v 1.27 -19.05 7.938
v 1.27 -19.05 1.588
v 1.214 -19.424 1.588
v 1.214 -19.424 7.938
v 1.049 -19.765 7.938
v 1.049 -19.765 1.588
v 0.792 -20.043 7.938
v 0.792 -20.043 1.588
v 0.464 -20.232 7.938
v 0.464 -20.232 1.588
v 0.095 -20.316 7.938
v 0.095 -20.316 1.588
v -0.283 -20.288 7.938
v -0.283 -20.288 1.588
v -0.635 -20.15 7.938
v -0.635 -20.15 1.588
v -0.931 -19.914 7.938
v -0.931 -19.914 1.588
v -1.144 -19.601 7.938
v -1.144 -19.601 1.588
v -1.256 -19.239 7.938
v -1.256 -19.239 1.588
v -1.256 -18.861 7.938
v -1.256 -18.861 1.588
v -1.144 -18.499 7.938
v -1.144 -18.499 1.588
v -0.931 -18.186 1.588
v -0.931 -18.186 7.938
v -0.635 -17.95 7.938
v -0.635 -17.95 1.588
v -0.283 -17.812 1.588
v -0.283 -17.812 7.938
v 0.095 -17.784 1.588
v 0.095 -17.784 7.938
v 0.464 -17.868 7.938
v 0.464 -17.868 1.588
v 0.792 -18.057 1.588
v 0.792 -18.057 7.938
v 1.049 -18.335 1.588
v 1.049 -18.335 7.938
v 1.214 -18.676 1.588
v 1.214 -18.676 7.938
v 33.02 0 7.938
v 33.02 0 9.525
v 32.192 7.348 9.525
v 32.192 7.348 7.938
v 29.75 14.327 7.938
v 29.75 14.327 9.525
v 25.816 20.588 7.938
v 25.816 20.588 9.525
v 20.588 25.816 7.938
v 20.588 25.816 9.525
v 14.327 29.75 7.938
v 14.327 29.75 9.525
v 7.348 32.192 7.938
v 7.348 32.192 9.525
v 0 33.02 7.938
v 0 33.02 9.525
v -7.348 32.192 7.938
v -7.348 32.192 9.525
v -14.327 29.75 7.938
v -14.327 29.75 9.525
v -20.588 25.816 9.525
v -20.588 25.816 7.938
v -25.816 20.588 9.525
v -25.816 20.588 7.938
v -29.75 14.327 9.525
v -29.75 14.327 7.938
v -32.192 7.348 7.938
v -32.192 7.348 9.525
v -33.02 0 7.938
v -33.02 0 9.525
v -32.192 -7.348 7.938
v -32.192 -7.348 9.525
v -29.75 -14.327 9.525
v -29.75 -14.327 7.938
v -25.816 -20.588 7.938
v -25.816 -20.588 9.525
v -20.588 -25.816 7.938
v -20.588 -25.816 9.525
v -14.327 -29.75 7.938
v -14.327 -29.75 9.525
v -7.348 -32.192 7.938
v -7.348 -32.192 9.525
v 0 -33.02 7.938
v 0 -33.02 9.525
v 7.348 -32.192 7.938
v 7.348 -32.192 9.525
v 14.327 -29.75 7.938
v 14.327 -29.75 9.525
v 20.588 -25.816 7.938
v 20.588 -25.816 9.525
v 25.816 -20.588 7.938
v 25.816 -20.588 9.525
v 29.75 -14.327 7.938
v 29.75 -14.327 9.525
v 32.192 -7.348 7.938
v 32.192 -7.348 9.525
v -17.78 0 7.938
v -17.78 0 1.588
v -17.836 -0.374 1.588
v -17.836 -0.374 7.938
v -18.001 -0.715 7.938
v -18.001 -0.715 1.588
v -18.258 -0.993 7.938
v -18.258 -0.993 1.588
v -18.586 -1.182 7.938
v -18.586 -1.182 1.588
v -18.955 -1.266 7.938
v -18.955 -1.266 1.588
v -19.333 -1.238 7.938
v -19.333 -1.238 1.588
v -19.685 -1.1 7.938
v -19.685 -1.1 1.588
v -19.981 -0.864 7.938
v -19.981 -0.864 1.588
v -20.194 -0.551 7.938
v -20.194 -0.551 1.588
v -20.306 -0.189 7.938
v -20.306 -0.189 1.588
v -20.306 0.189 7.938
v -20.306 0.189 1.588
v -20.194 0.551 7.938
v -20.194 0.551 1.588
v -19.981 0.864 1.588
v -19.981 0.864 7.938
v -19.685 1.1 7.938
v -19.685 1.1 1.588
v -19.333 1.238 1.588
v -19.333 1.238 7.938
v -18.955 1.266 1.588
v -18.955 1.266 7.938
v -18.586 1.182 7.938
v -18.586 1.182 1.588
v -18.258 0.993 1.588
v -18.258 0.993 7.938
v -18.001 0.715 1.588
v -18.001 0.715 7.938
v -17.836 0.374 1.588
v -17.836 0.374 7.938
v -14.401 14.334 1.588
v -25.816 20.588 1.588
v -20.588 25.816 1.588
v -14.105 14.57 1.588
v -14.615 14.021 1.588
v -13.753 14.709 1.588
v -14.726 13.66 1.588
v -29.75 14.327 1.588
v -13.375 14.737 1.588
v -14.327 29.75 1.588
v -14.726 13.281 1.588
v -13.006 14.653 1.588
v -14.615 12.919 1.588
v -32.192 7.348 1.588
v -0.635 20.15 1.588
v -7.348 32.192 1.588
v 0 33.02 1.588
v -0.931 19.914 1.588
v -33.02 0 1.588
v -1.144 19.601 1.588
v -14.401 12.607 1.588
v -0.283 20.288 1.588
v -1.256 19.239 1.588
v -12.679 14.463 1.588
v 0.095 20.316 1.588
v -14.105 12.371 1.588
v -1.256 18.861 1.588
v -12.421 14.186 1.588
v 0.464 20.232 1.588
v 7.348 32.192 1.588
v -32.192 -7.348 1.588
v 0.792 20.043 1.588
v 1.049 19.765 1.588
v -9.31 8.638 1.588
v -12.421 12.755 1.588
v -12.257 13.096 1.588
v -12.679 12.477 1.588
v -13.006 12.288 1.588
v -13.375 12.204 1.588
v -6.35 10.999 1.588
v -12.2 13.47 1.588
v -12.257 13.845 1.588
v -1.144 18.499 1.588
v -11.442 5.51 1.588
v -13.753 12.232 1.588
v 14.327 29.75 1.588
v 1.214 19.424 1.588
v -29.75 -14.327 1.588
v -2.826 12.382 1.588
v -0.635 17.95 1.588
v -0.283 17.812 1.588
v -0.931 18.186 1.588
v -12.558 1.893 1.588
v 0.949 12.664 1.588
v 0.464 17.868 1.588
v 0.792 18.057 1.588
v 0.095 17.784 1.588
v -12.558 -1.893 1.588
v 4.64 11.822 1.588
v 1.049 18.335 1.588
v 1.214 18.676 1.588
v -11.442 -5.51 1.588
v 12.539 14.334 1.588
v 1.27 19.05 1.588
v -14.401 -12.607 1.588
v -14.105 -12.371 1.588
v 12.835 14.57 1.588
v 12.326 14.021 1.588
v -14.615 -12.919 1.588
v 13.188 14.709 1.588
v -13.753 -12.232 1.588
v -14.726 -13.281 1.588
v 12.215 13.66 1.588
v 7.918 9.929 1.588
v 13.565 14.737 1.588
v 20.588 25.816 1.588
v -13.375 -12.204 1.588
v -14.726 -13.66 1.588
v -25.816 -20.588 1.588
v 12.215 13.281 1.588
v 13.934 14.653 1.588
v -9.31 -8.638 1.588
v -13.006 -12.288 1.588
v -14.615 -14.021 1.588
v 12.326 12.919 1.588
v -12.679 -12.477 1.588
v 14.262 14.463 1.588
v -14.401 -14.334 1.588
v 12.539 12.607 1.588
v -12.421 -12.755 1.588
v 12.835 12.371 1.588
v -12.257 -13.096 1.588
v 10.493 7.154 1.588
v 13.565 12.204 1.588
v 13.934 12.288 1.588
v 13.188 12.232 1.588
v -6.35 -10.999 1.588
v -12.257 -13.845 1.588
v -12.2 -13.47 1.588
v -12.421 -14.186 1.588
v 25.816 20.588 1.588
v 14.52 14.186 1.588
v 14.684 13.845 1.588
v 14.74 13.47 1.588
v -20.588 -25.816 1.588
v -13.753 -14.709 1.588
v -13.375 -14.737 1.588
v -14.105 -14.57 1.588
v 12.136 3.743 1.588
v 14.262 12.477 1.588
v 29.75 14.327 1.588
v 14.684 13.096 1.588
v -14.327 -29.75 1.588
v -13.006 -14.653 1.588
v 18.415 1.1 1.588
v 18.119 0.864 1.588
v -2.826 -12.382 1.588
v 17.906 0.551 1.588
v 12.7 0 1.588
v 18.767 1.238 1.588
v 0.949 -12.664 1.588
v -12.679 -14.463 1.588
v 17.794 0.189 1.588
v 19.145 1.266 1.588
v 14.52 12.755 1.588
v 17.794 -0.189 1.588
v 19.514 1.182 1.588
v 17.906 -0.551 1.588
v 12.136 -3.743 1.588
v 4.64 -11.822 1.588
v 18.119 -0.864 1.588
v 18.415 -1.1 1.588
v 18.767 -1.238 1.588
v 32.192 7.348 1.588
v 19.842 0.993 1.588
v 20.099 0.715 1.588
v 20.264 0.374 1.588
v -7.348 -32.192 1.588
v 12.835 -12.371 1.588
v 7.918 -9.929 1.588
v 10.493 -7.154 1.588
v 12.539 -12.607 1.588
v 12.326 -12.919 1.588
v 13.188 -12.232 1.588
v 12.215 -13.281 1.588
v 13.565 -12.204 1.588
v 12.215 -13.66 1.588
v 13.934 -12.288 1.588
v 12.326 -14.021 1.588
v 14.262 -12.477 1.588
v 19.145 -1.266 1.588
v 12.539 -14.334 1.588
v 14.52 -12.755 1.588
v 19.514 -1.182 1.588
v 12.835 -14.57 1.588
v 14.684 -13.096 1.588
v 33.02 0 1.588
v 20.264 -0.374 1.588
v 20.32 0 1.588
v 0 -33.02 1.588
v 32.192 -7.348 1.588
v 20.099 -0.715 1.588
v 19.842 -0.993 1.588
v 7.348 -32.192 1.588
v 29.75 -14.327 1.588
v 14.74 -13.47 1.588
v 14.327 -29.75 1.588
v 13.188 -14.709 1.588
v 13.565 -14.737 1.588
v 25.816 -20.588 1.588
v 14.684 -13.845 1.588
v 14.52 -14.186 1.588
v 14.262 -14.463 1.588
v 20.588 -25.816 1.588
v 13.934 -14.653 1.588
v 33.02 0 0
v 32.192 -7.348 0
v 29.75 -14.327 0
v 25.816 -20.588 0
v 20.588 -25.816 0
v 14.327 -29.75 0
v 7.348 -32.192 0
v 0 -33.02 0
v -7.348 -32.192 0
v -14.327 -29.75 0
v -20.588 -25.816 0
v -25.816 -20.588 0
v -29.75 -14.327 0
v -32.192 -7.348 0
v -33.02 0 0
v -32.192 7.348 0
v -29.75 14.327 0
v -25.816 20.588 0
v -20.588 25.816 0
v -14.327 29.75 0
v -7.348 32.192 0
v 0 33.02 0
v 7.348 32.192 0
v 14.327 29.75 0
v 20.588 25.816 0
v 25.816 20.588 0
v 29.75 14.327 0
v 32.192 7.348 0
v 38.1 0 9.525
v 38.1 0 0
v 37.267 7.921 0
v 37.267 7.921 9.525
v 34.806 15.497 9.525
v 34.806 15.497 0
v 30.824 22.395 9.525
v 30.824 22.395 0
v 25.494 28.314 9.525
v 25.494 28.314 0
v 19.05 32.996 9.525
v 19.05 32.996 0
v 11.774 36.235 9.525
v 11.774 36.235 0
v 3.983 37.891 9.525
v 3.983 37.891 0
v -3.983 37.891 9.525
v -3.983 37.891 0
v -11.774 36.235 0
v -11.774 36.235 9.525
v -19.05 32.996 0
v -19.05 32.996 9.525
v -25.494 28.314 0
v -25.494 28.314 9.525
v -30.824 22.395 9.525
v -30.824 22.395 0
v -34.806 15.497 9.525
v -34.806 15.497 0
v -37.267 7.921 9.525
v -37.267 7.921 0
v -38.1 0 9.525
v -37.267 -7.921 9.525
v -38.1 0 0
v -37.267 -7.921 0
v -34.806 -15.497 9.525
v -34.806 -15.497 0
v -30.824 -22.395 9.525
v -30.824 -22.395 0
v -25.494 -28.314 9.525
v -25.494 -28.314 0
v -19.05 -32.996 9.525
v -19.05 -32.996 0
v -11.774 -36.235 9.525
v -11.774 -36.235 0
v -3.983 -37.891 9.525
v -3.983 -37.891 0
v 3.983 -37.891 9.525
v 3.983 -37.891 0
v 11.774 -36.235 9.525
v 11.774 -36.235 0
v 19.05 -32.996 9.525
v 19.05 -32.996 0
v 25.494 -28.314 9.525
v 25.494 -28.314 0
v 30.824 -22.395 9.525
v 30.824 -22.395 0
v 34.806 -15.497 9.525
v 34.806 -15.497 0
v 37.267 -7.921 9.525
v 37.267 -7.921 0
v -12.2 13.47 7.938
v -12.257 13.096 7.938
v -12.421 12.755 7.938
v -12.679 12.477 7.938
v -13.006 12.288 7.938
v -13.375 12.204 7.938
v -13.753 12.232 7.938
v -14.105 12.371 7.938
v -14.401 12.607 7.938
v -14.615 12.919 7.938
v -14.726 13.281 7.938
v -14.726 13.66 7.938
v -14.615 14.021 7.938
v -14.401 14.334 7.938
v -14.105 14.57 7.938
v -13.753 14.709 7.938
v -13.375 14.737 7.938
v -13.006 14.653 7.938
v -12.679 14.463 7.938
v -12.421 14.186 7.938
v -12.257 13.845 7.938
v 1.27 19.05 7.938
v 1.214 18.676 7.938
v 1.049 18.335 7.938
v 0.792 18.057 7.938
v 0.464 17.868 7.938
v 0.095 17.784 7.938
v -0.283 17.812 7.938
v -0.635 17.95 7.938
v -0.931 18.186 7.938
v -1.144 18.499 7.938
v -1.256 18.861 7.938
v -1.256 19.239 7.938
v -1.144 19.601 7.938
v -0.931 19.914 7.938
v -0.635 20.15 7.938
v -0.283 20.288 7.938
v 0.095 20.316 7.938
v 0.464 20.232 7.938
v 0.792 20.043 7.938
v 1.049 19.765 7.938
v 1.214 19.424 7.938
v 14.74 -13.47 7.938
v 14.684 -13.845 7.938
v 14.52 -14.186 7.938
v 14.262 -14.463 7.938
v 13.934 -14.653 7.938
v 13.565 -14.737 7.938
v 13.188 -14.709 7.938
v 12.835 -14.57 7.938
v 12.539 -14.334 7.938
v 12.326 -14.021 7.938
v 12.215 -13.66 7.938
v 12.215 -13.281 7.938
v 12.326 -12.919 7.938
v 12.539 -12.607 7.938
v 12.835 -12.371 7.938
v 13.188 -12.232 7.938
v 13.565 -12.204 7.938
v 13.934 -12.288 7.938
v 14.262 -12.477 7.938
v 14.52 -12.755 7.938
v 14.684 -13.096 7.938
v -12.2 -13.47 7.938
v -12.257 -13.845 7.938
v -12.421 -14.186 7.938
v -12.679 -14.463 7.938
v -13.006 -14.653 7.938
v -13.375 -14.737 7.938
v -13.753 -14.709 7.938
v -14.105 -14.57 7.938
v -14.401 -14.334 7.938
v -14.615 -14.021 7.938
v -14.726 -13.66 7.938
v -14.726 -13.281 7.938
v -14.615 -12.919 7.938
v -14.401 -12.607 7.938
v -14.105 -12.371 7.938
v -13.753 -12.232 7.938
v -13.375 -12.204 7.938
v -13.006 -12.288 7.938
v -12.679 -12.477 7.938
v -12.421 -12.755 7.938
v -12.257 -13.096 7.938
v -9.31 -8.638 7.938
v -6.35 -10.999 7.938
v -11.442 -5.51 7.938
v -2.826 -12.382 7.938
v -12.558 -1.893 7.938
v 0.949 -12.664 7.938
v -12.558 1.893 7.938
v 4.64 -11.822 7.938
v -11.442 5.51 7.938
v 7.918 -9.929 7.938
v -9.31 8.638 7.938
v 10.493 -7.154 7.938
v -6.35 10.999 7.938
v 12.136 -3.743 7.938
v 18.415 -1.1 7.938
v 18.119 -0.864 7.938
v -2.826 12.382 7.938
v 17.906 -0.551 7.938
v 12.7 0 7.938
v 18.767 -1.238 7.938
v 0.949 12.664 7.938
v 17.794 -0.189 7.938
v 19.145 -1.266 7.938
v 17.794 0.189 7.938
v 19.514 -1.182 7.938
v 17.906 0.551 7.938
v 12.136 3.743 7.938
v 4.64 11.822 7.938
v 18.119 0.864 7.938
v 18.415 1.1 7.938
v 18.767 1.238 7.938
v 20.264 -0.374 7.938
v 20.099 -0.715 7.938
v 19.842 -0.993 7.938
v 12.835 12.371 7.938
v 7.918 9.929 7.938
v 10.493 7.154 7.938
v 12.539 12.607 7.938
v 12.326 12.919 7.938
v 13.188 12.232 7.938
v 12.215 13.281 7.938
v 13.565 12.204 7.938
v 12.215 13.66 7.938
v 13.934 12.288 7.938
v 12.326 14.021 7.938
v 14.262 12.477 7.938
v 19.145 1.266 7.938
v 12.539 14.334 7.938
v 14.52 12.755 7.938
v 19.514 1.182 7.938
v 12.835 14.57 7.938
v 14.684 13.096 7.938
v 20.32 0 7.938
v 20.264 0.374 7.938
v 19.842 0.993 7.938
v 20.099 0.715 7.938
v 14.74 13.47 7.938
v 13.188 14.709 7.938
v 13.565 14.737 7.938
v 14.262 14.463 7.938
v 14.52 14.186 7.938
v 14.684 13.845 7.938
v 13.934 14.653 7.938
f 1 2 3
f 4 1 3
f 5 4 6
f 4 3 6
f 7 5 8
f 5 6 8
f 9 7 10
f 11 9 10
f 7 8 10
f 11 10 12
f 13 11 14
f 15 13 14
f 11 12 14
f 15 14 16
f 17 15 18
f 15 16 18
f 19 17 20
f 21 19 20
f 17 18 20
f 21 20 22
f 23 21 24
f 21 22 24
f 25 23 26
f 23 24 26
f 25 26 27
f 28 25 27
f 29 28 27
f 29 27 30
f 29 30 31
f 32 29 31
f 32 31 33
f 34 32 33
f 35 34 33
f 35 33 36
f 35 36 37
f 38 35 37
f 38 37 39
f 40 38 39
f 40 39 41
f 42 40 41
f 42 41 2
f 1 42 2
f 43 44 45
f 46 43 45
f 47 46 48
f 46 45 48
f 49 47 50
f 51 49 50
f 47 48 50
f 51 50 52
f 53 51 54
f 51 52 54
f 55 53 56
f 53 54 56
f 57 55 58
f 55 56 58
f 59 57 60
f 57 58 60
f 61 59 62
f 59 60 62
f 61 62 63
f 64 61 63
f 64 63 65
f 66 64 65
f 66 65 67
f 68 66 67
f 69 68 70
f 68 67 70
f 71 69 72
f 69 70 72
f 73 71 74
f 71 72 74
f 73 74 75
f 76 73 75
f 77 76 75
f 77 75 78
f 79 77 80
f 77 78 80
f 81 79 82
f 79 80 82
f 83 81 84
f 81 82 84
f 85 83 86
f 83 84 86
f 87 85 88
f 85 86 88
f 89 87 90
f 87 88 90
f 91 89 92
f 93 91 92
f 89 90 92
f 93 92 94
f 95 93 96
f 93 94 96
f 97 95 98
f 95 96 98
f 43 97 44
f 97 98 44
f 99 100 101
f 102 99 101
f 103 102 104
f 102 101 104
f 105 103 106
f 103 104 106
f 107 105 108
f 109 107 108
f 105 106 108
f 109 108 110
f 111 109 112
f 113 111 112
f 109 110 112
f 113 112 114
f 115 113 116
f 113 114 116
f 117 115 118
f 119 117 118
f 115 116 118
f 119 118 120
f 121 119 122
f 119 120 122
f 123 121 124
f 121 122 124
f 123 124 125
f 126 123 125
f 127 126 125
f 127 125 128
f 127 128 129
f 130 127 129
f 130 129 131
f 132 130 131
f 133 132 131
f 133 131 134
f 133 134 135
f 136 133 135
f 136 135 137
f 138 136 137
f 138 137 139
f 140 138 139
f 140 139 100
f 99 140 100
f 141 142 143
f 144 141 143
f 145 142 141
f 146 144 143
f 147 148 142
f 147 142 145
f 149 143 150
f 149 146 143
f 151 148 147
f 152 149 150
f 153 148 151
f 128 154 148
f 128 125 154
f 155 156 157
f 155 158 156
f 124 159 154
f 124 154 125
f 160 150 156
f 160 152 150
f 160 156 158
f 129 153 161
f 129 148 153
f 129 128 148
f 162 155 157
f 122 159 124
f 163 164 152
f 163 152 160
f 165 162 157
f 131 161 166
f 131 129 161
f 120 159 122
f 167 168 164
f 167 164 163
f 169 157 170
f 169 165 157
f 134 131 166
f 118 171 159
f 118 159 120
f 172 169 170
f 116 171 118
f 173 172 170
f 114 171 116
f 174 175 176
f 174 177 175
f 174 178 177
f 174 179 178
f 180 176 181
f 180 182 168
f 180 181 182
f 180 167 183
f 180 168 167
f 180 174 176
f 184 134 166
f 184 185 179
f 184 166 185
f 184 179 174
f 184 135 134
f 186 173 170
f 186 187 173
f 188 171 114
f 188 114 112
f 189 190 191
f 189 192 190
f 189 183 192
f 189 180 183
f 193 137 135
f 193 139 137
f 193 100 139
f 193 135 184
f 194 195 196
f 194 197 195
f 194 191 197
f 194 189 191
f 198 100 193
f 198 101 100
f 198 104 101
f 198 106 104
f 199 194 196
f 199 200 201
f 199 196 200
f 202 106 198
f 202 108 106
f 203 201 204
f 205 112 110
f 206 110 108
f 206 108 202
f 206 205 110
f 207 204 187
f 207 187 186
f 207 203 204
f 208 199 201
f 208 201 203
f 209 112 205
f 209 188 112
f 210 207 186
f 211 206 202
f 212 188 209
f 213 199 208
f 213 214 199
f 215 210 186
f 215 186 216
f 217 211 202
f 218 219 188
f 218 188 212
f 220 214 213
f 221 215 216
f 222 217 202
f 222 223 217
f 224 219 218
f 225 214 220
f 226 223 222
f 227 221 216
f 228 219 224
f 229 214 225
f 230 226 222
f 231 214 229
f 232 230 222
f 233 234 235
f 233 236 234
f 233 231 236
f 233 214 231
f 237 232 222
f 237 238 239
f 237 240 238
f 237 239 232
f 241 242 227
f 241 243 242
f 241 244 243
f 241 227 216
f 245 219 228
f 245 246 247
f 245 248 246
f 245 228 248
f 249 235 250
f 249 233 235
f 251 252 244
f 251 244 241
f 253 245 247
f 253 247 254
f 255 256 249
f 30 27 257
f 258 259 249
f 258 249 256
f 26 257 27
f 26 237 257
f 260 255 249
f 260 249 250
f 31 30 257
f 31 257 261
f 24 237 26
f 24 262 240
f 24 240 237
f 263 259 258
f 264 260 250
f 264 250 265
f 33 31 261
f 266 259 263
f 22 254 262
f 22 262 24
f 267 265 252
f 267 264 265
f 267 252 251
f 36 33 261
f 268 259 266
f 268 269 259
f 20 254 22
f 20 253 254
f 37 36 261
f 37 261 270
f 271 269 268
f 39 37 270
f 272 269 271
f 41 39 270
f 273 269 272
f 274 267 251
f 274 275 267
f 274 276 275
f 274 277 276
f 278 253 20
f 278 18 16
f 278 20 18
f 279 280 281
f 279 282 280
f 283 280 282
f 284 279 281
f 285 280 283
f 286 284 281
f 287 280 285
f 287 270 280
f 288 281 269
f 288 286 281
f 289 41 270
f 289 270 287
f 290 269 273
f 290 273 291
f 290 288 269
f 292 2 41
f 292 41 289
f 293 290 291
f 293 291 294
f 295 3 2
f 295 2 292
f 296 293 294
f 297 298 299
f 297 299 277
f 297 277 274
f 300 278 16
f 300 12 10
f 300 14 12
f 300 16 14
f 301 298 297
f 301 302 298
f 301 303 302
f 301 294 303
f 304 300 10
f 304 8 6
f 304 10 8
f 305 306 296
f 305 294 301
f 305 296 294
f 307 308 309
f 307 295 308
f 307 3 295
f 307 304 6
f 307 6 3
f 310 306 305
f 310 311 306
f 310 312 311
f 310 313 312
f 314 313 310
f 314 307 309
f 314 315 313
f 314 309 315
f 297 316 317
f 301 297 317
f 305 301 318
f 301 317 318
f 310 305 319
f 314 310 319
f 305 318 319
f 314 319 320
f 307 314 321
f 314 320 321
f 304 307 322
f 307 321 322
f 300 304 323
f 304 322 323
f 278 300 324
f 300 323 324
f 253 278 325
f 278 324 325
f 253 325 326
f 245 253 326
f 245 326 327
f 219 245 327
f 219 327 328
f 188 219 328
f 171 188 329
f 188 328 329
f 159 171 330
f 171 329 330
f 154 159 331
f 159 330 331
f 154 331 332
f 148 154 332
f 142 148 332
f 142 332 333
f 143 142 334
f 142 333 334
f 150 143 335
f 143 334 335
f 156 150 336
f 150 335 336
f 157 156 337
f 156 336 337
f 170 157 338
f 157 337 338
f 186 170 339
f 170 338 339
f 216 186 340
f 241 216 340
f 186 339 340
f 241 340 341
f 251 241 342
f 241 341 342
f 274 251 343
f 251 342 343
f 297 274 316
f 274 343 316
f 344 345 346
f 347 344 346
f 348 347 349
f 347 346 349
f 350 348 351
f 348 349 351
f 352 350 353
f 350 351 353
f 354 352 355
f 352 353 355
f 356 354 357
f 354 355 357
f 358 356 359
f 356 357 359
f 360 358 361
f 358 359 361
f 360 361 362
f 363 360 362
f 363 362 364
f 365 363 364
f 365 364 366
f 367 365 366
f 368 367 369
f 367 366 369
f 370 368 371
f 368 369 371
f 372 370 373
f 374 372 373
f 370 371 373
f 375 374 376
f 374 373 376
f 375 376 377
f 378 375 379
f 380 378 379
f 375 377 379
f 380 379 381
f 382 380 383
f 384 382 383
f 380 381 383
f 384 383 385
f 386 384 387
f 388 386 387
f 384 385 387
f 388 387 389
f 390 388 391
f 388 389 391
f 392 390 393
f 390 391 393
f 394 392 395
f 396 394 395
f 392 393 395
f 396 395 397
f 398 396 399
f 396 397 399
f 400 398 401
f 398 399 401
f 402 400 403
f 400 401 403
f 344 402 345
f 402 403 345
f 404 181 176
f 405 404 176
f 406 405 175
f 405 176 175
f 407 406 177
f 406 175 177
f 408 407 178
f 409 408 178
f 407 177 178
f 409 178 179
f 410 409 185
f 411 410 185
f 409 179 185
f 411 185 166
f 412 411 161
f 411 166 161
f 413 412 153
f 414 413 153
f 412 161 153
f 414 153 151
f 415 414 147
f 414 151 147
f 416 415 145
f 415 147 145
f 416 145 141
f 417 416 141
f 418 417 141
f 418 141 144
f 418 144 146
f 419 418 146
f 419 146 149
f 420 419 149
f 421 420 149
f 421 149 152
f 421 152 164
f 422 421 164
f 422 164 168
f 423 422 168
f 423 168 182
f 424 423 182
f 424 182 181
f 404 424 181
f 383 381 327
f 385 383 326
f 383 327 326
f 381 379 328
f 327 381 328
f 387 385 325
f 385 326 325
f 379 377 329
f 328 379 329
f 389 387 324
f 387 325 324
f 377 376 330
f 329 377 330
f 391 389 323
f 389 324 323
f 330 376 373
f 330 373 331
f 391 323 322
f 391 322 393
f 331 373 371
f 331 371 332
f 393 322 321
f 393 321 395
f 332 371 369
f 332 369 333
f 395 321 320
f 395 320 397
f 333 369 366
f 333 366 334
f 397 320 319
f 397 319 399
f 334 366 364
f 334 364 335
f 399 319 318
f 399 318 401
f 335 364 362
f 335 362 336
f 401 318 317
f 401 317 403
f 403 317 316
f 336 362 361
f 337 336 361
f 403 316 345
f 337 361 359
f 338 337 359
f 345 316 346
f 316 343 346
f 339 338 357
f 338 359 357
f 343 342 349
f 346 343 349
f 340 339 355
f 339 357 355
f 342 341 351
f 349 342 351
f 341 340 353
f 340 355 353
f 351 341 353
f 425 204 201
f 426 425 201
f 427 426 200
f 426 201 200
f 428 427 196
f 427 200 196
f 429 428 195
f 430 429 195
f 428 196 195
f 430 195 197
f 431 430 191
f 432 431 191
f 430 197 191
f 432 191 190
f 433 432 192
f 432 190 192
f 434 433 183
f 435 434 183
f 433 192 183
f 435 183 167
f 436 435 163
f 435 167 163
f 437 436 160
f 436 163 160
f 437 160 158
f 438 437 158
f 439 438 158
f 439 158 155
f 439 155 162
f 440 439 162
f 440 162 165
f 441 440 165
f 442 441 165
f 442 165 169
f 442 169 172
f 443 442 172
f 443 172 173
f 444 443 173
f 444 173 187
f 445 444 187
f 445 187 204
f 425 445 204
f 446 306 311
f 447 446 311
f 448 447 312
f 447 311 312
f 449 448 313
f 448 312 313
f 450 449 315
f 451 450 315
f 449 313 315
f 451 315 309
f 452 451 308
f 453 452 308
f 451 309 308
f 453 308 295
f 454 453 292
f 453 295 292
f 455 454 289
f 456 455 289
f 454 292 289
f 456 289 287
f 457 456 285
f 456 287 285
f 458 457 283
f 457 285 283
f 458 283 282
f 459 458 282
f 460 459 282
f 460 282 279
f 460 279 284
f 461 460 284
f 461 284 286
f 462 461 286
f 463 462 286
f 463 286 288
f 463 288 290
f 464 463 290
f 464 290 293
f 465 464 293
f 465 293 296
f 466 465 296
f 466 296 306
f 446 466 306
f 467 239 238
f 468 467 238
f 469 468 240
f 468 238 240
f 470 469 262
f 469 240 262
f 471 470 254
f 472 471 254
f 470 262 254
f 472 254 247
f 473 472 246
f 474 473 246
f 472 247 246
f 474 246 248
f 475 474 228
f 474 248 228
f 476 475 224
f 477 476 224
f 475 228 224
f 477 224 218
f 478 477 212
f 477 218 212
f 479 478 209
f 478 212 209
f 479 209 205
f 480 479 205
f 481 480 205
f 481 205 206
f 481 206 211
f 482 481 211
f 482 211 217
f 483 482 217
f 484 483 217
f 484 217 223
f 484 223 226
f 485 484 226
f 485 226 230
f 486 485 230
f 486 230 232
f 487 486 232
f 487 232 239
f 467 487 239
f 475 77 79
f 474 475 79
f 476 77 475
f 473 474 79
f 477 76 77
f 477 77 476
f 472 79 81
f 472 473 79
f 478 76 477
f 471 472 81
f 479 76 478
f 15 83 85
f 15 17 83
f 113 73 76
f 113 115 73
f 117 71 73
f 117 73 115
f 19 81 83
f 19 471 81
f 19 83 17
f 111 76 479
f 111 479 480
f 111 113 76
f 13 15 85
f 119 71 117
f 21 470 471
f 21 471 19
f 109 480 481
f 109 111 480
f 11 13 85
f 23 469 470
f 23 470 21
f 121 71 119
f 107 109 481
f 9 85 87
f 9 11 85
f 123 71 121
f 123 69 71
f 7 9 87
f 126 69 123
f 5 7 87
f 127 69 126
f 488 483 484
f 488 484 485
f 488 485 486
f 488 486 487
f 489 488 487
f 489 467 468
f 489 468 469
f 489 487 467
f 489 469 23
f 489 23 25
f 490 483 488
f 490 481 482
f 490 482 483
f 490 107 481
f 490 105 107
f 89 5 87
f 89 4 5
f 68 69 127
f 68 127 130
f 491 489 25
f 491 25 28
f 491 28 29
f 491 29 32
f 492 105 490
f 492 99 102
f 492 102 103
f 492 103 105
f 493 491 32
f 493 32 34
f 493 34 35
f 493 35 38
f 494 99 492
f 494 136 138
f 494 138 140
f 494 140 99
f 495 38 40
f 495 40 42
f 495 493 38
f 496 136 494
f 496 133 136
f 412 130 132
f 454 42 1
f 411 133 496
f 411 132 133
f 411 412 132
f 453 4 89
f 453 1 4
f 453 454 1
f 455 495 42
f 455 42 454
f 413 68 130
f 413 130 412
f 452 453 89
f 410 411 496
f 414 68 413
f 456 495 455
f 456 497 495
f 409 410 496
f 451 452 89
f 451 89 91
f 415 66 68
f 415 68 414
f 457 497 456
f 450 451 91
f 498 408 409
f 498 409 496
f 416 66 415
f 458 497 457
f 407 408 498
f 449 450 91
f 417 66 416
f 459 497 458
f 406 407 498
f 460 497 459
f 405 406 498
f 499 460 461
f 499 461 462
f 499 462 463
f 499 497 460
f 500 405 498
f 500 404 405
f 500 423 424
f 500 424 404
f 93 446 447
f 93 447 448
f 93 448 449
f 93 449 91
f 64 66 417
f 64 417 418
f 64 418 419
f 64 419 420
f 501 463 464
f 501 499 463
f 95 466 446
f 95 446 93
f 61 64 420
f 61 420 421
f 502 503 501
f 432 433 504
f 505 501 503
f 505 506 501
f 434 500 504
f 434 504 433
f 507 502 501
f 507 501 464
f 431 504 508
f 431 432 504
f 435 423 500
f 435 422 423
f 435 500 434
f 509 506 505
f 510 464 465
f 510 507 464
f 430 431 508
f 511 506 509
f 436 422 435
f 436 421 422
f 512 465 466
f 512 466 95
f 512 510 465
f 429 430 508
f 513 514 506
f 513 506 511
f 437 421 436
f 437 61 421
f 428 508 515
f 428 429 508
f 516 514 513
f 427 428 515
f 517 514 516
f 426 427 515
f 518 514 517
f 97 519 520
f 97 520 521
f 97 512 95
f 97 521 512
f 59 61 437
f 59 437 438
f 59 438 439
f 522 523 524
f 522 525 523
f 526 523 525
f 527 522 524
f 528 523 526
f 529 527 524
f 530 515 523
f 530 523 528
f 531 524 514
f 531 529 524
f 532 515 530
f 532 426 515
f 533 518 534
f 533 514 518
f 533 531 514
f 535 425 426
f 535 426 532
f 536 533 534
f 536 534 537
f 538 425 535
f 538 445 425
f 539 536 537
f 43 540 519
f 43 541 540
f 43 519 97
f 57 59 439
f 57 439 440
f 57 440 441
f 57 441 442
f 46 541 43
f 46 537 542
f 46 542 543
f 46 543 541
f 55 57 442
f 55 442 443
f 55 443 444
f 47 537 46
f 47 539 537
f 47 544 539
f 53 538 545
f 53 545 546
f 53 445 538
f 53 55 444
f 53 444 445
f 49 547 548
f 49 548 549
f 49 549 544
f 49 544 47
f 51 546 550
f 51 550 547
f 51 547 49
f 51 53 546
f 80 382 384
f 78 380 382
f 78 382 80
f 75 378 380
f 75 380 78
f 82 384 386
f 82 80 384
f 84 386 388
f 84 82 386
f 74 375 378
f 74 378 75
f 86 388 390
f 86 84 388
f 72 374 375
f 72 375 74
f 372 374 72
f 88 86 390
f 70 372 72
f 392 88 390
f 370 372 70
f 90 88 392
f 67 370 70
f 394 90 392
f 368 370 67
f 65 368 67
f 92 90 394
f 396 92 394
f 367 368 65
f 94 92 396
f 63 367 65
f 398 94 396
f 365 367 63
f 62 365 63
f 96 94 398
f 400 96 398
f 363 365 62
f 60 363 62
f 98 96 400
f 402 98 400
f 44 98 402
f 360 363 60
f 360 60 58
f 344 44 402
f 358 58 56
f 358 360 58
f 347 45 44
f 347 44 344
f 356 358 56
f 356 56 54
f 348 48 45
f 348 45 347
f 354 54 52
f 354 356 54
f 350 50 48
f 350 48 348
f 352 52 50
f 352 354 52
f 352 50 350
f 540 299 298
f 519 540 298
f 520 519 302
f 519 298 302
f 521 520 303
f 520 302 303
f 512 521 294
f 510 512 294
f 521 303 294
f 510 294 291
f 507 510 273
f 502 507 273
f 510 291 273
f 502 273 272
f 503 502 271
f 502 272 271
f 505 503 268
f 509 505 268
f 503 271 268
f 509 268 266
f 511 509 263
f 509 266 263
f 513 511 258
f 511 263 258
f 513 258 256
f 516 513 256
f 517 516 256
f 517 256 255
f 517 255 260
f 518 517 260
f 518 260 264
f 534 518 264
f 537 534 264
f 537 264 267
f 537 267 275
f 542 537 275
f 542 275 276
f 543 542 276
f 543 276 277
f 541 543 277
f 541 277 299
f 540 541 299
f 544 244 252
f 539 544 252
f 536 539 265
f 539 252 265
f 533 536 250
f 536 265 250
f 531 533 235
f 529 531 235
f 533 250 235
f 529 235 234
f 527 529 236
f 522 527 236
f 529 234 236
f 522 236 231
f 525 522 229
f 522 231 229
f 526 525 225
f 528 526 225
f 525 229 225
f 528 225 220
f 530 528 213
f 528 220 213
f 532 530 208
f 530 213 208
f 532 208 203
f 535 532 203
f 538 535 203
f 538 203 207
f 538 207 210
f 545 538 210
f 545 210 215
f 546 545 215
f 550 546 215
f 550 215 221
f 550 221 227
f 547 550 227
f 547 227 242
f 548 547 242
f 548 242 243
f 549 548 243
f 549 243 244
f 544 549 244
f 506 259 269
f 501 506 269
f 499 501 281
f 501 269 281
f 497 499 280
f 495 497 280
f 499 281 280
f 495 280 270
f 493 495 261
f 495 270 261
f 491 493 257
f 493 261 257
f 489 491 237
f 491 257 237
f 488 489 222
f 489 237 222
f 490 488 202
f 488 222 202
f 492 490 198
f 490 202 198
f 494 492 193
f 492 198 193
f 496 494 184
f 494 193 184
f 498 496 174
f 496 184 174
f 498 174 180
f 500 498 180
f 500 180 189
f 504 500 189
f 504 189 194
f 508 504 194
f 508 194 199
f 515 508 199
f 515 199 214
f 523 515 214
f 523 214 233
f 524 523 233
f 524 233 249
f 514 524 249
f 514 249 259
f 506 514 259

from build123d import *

# Parameters (mm, degrees)
F0_R     = 38.1
F1_DEPTH = 9.525
F2_R     = 33.02
F3_DEPTH = 1.5875
F4_R     = 33.02
F5_DEPTH = 1.5875
F6_R     = 12.7
F6_R_2   = 1.27
F7_DEPTH = 25.4


with BuildPart() as f1:
    # F0 (on Top) → F1 (new body)
    with BuildSketch(Plane.XY):
        Circle(F0_R)
    extrude(amount=F1_DEPTH)

    # F2 (on face) → F3 (cut)
    with BuildSketch(Plane(origin=(0, 0, 0), x_dir=(1, 0, 0), z_dir=(0, 0, -1))):
        Circle(F2_R)
    extrude(amount=-F3_DEPTH, mode=Mode.SUBTRACT)

    # F4 (on face) → F5 (cut)
    with BuildSketch(Plane.XY.offset(9.525)):
        Circle(F4_R)
    extrude(amount=-F5_DEPTH, mode=Mode.SUBTRACT)

    # F6 (on face) → F7 (cut)
    with BuildSketch(Plane(origin=(0, 0, 1.5875), x_dir=(1, 0, 0), z_dir=(0, 0, -1))):
        Circle(F6_R)
        with Locations((-19.05, 0)):
            Circle(F6_R_2)
        with Locations((-13.470384, -13.470384)):
            Circle(F6_R_2)
        with Locations((0, -19.05)):
            Circle(F6_R_2)
        with Locations((13.470384, -13.470384)):
            Circle(F6_R_2)
        with Locations((19.05, 0)):
            Circle(F6_R_2)
        with Locations((13.470384, 13.470384)):
            Circle(F6_R_2)
        with Locations((0, 19.05)):
            Circle(F6_R_2)
        with Locations((-13.470384, 13.470384)):
            Circle(F6_R_2)
    extrude(amount=-F7_DEPTH, mode=Mode.SUBTRACT)


solid = f1.part
